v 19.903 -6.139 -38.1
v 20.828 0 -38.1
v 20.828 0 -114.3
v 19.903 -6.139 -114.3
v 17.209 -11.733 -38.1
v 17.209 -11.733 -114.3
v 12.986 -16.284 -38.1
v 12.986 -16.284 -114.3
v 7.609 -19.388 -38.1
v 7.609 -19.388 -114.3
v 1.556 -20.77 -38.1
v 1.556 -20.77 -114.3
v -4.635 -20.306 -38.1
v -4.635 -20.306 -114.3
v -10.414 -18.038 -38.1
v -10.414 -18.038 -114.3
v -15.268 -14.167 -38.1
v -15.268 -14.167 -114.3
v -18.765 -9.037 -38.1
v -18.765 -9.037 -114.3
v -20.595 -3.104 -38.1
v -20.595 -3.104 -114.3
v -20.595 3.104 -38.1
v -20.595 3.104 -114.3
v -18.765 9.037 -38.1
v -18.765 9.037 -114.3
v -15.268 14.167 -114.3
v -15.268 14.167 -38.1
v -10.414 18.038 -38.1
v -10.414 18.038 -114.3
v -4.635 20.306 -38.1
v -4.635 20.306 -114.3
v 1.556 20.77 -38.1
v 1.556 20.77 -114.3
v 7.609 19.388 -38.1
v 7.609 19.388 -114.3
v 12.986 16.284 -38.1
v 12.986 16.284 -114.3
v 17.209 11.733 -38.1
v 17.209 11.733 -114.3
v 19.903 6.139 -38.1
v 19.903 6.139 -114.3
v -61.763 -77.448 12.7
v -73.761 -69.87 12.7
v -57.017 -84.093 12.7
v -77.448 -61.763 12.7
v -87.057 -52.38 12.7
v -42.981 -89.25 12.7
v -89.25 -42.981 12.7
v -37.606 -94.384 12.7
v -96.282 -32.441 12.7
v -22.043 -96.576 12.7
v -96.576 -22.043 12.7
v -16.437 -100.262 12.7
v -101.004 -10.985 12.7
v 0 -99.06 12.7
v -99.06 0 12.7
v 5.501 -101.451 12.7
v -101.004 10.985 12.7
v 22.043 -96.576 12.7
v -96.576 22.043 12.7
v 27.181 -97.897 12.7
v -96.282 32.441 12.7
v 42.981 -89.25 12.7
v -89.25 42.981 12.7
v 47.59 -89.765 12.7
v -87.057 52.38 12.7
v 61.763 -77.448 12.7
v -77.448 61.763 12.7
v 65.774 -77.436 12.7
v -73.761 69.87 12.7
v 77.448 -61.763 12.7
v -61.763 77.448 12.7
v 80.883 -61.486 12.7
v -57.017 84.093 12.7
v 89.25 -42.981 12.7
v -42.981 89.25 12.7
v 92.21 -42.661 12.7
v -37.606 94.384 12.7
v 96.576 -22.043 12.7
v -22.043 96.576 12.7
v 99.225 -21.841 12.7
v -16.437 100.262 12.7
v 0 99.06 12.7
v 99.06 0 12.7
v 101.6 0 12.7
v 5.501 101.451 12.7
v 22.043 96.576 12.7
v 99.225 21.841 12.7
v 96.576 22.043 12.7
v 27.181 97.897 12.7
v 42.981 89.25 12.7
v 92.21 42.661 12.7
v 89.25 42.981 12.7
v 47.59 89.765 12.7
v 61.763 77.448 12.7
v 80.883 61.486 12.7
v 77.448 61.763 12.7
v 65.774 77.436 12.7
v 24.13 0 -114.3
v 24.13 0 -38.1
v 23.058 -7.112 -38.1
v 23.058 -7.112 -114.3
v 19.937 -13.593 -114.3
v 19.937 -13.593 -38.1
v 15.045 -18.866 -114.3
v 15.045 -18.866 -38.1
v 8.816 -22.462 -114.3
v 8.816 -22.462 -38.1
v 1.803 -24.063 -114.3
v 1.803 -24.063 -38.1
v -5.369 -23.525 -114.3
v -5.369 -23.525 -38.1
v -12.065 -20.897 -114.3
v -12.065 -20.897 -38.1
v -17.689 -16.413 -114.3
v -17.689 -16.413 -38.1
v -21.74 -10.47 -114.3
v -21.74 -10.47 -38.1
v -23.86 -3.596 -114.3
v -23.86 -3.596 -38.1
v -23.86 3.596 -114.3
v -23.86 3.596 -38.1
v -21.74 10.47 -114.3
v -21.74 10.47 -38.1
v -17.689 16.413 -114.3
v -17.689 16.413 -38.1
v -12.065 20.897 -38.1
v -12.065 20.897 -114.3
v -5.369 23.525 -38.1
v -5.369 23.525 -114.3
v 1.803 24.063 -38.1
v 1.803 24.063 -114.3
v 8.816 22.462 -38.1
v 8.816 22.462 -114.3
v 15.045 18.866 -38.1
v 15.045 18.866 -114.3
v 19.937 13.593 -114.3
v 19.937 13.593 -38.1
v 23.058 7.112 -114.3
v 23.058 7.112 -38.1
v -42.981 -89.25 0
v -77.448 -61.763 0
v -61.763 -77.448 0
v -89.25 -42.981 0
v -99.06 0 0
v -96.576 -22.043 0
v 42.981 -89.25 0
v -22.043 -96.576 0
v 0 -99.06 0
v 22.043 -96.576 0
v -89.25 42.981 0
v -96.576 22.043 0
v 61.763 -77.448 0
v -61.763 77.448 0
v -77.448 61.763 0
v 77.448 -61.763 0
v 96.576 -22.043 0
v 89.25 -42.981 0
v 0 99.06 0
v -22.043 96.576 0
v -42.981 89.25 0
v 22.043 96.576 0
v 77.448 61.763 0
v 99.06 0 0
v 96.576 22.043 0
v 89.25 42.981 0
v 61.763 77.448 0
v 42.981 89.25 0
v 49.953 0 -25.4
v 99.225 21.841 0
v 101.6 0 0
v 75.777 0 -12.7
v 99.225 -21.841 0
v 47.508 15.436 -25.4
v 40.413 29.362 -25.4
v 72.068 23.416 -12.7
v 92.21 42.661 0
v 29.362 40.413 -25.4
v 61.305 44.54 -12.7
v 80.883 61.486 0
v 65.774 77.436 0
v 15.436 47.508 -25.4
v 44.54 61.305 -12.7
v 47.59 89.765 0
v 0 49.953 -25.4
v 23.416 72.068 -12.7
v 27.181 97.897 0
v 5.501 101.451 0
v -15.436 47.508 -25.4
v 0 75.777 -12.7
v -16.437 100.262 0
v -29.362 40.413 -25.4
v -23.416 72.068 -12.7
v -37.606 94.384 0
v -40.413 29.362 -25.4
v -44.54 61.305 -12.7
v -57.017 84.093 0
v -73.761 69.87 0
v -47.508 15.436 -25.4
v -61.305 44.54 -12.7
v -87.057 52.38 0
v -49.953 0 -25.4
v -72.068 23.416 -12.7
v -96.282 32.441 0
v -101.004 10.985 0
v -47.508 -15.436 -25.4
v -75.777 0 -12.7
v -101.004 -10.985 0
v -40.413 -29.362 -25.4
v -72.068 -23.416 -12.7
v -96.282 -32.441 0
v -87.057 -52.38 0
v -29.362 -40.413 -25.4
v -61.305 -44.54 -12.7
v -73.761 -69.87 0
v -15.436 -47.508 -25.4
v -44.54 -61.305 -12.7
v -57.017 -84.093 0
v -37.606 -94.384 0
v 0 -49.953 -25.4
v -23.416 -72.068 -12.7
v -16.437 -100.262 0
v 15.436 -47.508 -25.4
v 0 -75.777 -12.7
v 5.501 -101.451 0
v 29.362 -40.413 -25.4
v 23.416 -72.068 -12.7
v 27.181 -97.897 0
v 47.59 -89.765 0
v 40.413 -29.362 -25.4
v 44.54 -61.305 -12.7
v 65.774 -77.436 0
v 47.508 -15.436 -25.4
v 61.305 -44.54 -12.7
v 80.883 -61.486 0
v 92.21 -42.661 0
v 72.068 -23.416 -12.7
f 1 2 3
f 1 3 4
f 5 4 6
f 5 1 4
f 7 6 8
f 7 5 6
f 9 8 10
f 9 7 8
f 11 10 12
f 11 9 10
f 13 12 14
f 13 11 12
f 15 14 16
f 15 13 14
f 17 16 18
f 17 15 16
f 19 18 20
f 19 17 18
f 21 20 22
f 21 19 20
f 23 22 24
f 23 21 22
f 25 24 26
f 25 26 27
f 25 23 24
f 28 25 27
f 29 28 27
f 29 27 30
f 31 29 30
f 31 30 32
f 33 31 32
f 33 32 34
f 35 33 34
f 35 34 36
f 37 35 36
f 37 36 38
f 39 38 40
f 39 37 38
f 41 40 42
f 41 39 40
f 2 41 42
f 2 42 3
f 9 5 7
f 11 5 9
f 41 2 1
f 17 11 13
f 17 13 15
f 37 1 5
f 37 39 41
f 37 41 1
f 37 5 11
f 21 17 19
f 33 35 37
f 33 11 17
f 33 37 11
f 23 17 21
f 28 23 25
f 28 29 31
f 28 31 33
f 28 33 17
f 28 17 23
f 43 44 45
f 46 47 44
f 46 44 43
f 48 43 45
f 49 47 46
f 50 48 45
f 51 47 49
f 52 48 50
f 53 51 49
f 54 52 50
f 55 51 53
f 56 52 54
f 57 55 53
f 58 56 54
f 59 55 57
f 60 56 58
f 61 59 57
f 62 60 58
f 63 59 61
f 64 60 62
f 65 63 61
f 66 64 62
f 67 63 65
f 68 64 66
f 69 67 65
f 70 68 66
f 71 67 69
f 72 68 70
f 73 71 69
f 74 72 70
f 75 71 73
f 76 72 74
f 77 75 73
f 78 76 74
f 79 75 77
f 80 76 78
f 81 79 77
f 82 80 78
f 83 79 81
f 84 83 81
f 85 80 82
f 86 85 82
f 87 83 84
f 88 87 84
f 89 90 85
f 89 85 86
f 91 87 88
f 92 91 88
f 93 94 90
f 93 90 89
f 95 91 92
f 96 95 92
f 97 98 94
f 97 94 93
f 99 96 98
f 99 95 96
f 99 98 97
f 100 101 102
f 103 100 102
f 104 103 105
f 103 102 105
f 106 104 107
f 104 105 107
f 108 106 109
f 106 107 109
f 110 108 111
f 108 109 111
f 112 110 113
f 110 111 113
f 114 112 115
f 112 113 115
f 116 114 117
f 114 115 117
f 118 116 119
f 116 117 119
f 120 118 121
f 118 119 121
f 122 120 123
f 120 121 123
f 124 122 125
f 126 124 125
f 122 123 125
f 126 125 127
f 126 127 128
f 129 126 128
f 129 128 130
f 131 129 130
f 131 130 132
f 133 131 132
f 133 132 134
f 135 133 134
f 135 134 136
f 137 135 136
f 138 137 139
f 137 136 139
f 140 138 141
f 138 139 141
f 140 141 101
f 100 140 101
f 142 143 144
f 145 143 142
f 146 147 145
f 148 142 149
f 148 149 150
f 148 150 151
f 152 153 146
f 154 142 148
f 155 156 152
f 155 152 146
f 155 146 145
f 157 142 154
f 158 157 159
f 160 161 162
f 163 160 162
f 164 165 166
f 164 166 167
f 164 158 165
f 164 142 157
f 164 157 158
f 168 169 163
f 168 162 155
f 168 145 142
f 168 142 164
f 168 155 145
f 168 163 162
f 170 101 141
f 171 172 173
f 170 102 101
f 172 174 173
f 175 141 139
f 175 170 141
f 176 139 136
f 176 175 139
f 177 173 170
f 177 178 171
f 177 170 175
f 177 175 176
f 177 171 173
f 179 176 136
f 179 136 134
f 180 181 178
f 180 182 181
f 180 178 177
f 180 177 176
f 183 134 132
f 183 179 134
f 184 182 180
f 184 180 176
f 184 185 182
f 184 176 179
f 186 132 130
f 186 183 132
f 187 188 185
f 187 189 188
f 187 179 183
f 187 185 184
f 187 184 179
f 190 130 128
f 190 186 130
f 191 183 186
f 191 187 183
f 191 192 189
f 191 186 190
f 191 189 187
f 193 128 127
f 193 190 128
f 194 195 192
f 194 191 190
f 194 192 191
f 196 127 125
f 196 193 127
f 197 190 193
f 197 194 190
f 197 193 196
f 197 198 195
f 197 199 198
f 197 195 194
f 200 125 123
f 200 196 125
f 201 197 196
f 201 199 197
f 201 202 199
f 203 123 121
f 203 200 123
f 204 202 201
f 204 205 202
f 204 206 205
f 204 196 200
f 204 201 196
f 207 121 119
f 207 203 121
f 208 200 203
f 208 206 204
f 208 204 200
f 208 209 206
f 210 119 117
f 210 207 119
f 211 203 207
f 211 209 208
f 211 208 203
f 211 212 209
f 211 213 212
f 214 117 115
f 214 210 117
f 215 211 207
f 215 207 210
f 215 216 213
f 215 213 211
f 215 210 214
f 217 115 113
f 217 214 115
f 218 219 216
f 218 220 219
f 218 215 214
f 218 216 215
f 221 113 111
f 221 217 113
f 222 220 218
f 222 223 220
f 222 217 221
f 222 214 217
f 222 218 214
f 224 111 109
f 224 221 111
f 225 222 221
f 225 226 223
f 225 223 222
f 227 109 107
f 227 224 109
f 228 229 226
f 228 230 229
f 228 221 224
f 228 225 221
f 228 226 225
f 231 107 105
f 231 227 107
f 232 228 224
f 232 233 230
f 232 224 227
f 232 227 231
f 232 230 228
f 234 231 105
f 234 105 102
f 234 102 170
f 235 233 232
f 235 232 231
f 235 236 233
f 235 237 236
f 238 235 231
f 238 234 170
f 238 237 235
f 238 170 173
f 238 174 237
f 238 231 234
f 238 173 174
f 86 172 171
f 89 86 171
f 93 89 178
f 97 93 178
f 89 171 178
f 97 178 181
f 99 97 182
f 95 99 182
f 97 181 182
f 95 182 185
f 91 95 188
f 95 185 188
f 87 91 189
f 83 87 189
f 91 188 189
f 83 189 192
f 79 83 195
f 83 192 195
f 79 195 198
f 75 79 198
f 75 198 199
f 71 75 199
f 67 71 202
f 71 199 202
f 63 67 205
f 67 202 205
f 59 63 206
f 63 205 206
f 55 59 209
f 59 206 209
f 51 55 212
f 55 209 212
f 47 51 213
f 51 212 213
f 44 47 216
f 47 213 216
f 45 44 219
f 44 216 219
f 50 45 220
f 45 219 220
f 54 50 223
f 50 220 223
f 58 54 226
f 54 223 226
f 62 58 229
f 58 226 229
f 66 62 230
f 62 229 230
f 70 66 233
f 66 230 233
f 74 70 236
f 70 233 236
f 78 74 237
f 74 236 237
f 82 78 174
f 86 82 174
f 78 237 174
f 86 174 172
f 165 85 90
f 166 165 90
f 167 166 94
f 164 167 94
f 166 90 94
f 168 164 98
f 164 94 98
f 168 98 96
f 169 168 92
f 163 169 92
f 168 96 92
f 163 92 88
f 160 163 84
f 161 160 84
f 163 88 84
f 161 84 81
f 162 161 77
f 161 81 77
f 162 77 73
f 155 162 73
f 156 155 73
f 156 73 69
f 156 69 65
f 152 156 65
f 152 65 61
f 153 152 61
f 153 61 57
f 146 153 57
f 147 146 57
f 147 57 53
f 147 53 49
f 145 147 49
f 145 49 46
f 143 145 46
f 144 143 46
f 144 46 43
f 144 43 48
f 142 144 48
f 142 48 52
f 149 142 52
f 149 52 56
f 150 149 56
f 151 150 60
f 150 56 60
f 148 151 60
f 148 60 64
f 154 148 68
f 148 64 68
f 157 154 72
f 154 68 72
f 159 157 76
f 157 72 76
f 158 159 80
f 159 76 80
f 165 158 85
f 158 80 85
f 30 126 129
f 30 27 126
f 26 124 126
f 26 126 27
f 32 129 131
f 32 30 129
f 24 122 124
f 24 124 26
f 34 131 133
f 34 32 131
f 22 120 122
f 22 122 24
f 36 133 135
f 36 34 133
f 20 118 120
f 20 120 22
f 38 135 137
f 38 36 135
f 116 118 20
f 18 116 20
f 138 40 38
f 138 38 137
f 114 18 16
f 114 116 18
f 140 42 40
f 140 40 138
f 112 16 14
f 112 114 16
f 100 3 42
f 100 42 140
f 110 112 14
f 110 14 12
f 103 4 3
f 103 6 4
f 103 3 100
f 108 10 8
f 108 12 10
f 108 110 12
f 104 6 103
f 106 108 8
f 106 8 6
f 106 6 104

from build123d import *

# Parameters (mm, degrees)
SKETCH1_R           = 101.6
BOSS_EXTRUDE1_DEPTH = 12.7
SKETCH4_R           = 99.06
CUT_EXTRUDE1_DEPTH  = 38.1
SKETCH6_R           = 24.13
SKETCH6_R_2         = 20.828
BOSS_EXTRUDE2_DEPTH = 76.2


with BuildPart() as part:
    # Sketch1 → Boss-Extrude1 (new body)
    with BuildSketch(Plane.XY):
        Circle(SKETCH1_R)
    extrude(amount=BOSS_EXTRUDE1_DEPTH)

    # Sketch4 → Cut-Extrude1 (cut)
    with BuildSketch(Plane.XY.offset(12.7)):
        Circle(SKETCH4_R)
    extrude(amount=-CUT_EXTRUDE1_DEPTH, mode=Mode.SUBTRACT)



with BuildPart() as body_2:
    # Sketch6 → Boss-Extrude2 (new body)
    with BuildSketch(Plane(origin=(0, 0, -38.1), x_dir=(-1, 0, 0), z_dir=(0, 0, -1))):
        with Locations(Location((0, 0, 0), (0, 0, 180))):
            Circle(SKETCH6_R)
        with Locations(Location((0, 0, 0), (0, 0, 180))):
            Circle(SKETCH6_R_2, mode=Mode.SUBTRACT)
    extrude(amount=BOSS_EXTRUDE2_DEPTH)


with BuildPart() as part_1:
    add(part.part)

    add(body_2.part)  # Loft2 merges body 2
    # Loft2: read off the stored shape, not the designer's step
    # Loft2 outline → Loft2 (revolve)
    with BuildSketch(Plane.XZ):
        Polygon((101.6, 0), (0, 0), (0, -38.1), (24.13, -38.1), align=None)
    revolve(axis=Axis((0, 0, 0), (0, 0, 1)))


solid = part_1.part
